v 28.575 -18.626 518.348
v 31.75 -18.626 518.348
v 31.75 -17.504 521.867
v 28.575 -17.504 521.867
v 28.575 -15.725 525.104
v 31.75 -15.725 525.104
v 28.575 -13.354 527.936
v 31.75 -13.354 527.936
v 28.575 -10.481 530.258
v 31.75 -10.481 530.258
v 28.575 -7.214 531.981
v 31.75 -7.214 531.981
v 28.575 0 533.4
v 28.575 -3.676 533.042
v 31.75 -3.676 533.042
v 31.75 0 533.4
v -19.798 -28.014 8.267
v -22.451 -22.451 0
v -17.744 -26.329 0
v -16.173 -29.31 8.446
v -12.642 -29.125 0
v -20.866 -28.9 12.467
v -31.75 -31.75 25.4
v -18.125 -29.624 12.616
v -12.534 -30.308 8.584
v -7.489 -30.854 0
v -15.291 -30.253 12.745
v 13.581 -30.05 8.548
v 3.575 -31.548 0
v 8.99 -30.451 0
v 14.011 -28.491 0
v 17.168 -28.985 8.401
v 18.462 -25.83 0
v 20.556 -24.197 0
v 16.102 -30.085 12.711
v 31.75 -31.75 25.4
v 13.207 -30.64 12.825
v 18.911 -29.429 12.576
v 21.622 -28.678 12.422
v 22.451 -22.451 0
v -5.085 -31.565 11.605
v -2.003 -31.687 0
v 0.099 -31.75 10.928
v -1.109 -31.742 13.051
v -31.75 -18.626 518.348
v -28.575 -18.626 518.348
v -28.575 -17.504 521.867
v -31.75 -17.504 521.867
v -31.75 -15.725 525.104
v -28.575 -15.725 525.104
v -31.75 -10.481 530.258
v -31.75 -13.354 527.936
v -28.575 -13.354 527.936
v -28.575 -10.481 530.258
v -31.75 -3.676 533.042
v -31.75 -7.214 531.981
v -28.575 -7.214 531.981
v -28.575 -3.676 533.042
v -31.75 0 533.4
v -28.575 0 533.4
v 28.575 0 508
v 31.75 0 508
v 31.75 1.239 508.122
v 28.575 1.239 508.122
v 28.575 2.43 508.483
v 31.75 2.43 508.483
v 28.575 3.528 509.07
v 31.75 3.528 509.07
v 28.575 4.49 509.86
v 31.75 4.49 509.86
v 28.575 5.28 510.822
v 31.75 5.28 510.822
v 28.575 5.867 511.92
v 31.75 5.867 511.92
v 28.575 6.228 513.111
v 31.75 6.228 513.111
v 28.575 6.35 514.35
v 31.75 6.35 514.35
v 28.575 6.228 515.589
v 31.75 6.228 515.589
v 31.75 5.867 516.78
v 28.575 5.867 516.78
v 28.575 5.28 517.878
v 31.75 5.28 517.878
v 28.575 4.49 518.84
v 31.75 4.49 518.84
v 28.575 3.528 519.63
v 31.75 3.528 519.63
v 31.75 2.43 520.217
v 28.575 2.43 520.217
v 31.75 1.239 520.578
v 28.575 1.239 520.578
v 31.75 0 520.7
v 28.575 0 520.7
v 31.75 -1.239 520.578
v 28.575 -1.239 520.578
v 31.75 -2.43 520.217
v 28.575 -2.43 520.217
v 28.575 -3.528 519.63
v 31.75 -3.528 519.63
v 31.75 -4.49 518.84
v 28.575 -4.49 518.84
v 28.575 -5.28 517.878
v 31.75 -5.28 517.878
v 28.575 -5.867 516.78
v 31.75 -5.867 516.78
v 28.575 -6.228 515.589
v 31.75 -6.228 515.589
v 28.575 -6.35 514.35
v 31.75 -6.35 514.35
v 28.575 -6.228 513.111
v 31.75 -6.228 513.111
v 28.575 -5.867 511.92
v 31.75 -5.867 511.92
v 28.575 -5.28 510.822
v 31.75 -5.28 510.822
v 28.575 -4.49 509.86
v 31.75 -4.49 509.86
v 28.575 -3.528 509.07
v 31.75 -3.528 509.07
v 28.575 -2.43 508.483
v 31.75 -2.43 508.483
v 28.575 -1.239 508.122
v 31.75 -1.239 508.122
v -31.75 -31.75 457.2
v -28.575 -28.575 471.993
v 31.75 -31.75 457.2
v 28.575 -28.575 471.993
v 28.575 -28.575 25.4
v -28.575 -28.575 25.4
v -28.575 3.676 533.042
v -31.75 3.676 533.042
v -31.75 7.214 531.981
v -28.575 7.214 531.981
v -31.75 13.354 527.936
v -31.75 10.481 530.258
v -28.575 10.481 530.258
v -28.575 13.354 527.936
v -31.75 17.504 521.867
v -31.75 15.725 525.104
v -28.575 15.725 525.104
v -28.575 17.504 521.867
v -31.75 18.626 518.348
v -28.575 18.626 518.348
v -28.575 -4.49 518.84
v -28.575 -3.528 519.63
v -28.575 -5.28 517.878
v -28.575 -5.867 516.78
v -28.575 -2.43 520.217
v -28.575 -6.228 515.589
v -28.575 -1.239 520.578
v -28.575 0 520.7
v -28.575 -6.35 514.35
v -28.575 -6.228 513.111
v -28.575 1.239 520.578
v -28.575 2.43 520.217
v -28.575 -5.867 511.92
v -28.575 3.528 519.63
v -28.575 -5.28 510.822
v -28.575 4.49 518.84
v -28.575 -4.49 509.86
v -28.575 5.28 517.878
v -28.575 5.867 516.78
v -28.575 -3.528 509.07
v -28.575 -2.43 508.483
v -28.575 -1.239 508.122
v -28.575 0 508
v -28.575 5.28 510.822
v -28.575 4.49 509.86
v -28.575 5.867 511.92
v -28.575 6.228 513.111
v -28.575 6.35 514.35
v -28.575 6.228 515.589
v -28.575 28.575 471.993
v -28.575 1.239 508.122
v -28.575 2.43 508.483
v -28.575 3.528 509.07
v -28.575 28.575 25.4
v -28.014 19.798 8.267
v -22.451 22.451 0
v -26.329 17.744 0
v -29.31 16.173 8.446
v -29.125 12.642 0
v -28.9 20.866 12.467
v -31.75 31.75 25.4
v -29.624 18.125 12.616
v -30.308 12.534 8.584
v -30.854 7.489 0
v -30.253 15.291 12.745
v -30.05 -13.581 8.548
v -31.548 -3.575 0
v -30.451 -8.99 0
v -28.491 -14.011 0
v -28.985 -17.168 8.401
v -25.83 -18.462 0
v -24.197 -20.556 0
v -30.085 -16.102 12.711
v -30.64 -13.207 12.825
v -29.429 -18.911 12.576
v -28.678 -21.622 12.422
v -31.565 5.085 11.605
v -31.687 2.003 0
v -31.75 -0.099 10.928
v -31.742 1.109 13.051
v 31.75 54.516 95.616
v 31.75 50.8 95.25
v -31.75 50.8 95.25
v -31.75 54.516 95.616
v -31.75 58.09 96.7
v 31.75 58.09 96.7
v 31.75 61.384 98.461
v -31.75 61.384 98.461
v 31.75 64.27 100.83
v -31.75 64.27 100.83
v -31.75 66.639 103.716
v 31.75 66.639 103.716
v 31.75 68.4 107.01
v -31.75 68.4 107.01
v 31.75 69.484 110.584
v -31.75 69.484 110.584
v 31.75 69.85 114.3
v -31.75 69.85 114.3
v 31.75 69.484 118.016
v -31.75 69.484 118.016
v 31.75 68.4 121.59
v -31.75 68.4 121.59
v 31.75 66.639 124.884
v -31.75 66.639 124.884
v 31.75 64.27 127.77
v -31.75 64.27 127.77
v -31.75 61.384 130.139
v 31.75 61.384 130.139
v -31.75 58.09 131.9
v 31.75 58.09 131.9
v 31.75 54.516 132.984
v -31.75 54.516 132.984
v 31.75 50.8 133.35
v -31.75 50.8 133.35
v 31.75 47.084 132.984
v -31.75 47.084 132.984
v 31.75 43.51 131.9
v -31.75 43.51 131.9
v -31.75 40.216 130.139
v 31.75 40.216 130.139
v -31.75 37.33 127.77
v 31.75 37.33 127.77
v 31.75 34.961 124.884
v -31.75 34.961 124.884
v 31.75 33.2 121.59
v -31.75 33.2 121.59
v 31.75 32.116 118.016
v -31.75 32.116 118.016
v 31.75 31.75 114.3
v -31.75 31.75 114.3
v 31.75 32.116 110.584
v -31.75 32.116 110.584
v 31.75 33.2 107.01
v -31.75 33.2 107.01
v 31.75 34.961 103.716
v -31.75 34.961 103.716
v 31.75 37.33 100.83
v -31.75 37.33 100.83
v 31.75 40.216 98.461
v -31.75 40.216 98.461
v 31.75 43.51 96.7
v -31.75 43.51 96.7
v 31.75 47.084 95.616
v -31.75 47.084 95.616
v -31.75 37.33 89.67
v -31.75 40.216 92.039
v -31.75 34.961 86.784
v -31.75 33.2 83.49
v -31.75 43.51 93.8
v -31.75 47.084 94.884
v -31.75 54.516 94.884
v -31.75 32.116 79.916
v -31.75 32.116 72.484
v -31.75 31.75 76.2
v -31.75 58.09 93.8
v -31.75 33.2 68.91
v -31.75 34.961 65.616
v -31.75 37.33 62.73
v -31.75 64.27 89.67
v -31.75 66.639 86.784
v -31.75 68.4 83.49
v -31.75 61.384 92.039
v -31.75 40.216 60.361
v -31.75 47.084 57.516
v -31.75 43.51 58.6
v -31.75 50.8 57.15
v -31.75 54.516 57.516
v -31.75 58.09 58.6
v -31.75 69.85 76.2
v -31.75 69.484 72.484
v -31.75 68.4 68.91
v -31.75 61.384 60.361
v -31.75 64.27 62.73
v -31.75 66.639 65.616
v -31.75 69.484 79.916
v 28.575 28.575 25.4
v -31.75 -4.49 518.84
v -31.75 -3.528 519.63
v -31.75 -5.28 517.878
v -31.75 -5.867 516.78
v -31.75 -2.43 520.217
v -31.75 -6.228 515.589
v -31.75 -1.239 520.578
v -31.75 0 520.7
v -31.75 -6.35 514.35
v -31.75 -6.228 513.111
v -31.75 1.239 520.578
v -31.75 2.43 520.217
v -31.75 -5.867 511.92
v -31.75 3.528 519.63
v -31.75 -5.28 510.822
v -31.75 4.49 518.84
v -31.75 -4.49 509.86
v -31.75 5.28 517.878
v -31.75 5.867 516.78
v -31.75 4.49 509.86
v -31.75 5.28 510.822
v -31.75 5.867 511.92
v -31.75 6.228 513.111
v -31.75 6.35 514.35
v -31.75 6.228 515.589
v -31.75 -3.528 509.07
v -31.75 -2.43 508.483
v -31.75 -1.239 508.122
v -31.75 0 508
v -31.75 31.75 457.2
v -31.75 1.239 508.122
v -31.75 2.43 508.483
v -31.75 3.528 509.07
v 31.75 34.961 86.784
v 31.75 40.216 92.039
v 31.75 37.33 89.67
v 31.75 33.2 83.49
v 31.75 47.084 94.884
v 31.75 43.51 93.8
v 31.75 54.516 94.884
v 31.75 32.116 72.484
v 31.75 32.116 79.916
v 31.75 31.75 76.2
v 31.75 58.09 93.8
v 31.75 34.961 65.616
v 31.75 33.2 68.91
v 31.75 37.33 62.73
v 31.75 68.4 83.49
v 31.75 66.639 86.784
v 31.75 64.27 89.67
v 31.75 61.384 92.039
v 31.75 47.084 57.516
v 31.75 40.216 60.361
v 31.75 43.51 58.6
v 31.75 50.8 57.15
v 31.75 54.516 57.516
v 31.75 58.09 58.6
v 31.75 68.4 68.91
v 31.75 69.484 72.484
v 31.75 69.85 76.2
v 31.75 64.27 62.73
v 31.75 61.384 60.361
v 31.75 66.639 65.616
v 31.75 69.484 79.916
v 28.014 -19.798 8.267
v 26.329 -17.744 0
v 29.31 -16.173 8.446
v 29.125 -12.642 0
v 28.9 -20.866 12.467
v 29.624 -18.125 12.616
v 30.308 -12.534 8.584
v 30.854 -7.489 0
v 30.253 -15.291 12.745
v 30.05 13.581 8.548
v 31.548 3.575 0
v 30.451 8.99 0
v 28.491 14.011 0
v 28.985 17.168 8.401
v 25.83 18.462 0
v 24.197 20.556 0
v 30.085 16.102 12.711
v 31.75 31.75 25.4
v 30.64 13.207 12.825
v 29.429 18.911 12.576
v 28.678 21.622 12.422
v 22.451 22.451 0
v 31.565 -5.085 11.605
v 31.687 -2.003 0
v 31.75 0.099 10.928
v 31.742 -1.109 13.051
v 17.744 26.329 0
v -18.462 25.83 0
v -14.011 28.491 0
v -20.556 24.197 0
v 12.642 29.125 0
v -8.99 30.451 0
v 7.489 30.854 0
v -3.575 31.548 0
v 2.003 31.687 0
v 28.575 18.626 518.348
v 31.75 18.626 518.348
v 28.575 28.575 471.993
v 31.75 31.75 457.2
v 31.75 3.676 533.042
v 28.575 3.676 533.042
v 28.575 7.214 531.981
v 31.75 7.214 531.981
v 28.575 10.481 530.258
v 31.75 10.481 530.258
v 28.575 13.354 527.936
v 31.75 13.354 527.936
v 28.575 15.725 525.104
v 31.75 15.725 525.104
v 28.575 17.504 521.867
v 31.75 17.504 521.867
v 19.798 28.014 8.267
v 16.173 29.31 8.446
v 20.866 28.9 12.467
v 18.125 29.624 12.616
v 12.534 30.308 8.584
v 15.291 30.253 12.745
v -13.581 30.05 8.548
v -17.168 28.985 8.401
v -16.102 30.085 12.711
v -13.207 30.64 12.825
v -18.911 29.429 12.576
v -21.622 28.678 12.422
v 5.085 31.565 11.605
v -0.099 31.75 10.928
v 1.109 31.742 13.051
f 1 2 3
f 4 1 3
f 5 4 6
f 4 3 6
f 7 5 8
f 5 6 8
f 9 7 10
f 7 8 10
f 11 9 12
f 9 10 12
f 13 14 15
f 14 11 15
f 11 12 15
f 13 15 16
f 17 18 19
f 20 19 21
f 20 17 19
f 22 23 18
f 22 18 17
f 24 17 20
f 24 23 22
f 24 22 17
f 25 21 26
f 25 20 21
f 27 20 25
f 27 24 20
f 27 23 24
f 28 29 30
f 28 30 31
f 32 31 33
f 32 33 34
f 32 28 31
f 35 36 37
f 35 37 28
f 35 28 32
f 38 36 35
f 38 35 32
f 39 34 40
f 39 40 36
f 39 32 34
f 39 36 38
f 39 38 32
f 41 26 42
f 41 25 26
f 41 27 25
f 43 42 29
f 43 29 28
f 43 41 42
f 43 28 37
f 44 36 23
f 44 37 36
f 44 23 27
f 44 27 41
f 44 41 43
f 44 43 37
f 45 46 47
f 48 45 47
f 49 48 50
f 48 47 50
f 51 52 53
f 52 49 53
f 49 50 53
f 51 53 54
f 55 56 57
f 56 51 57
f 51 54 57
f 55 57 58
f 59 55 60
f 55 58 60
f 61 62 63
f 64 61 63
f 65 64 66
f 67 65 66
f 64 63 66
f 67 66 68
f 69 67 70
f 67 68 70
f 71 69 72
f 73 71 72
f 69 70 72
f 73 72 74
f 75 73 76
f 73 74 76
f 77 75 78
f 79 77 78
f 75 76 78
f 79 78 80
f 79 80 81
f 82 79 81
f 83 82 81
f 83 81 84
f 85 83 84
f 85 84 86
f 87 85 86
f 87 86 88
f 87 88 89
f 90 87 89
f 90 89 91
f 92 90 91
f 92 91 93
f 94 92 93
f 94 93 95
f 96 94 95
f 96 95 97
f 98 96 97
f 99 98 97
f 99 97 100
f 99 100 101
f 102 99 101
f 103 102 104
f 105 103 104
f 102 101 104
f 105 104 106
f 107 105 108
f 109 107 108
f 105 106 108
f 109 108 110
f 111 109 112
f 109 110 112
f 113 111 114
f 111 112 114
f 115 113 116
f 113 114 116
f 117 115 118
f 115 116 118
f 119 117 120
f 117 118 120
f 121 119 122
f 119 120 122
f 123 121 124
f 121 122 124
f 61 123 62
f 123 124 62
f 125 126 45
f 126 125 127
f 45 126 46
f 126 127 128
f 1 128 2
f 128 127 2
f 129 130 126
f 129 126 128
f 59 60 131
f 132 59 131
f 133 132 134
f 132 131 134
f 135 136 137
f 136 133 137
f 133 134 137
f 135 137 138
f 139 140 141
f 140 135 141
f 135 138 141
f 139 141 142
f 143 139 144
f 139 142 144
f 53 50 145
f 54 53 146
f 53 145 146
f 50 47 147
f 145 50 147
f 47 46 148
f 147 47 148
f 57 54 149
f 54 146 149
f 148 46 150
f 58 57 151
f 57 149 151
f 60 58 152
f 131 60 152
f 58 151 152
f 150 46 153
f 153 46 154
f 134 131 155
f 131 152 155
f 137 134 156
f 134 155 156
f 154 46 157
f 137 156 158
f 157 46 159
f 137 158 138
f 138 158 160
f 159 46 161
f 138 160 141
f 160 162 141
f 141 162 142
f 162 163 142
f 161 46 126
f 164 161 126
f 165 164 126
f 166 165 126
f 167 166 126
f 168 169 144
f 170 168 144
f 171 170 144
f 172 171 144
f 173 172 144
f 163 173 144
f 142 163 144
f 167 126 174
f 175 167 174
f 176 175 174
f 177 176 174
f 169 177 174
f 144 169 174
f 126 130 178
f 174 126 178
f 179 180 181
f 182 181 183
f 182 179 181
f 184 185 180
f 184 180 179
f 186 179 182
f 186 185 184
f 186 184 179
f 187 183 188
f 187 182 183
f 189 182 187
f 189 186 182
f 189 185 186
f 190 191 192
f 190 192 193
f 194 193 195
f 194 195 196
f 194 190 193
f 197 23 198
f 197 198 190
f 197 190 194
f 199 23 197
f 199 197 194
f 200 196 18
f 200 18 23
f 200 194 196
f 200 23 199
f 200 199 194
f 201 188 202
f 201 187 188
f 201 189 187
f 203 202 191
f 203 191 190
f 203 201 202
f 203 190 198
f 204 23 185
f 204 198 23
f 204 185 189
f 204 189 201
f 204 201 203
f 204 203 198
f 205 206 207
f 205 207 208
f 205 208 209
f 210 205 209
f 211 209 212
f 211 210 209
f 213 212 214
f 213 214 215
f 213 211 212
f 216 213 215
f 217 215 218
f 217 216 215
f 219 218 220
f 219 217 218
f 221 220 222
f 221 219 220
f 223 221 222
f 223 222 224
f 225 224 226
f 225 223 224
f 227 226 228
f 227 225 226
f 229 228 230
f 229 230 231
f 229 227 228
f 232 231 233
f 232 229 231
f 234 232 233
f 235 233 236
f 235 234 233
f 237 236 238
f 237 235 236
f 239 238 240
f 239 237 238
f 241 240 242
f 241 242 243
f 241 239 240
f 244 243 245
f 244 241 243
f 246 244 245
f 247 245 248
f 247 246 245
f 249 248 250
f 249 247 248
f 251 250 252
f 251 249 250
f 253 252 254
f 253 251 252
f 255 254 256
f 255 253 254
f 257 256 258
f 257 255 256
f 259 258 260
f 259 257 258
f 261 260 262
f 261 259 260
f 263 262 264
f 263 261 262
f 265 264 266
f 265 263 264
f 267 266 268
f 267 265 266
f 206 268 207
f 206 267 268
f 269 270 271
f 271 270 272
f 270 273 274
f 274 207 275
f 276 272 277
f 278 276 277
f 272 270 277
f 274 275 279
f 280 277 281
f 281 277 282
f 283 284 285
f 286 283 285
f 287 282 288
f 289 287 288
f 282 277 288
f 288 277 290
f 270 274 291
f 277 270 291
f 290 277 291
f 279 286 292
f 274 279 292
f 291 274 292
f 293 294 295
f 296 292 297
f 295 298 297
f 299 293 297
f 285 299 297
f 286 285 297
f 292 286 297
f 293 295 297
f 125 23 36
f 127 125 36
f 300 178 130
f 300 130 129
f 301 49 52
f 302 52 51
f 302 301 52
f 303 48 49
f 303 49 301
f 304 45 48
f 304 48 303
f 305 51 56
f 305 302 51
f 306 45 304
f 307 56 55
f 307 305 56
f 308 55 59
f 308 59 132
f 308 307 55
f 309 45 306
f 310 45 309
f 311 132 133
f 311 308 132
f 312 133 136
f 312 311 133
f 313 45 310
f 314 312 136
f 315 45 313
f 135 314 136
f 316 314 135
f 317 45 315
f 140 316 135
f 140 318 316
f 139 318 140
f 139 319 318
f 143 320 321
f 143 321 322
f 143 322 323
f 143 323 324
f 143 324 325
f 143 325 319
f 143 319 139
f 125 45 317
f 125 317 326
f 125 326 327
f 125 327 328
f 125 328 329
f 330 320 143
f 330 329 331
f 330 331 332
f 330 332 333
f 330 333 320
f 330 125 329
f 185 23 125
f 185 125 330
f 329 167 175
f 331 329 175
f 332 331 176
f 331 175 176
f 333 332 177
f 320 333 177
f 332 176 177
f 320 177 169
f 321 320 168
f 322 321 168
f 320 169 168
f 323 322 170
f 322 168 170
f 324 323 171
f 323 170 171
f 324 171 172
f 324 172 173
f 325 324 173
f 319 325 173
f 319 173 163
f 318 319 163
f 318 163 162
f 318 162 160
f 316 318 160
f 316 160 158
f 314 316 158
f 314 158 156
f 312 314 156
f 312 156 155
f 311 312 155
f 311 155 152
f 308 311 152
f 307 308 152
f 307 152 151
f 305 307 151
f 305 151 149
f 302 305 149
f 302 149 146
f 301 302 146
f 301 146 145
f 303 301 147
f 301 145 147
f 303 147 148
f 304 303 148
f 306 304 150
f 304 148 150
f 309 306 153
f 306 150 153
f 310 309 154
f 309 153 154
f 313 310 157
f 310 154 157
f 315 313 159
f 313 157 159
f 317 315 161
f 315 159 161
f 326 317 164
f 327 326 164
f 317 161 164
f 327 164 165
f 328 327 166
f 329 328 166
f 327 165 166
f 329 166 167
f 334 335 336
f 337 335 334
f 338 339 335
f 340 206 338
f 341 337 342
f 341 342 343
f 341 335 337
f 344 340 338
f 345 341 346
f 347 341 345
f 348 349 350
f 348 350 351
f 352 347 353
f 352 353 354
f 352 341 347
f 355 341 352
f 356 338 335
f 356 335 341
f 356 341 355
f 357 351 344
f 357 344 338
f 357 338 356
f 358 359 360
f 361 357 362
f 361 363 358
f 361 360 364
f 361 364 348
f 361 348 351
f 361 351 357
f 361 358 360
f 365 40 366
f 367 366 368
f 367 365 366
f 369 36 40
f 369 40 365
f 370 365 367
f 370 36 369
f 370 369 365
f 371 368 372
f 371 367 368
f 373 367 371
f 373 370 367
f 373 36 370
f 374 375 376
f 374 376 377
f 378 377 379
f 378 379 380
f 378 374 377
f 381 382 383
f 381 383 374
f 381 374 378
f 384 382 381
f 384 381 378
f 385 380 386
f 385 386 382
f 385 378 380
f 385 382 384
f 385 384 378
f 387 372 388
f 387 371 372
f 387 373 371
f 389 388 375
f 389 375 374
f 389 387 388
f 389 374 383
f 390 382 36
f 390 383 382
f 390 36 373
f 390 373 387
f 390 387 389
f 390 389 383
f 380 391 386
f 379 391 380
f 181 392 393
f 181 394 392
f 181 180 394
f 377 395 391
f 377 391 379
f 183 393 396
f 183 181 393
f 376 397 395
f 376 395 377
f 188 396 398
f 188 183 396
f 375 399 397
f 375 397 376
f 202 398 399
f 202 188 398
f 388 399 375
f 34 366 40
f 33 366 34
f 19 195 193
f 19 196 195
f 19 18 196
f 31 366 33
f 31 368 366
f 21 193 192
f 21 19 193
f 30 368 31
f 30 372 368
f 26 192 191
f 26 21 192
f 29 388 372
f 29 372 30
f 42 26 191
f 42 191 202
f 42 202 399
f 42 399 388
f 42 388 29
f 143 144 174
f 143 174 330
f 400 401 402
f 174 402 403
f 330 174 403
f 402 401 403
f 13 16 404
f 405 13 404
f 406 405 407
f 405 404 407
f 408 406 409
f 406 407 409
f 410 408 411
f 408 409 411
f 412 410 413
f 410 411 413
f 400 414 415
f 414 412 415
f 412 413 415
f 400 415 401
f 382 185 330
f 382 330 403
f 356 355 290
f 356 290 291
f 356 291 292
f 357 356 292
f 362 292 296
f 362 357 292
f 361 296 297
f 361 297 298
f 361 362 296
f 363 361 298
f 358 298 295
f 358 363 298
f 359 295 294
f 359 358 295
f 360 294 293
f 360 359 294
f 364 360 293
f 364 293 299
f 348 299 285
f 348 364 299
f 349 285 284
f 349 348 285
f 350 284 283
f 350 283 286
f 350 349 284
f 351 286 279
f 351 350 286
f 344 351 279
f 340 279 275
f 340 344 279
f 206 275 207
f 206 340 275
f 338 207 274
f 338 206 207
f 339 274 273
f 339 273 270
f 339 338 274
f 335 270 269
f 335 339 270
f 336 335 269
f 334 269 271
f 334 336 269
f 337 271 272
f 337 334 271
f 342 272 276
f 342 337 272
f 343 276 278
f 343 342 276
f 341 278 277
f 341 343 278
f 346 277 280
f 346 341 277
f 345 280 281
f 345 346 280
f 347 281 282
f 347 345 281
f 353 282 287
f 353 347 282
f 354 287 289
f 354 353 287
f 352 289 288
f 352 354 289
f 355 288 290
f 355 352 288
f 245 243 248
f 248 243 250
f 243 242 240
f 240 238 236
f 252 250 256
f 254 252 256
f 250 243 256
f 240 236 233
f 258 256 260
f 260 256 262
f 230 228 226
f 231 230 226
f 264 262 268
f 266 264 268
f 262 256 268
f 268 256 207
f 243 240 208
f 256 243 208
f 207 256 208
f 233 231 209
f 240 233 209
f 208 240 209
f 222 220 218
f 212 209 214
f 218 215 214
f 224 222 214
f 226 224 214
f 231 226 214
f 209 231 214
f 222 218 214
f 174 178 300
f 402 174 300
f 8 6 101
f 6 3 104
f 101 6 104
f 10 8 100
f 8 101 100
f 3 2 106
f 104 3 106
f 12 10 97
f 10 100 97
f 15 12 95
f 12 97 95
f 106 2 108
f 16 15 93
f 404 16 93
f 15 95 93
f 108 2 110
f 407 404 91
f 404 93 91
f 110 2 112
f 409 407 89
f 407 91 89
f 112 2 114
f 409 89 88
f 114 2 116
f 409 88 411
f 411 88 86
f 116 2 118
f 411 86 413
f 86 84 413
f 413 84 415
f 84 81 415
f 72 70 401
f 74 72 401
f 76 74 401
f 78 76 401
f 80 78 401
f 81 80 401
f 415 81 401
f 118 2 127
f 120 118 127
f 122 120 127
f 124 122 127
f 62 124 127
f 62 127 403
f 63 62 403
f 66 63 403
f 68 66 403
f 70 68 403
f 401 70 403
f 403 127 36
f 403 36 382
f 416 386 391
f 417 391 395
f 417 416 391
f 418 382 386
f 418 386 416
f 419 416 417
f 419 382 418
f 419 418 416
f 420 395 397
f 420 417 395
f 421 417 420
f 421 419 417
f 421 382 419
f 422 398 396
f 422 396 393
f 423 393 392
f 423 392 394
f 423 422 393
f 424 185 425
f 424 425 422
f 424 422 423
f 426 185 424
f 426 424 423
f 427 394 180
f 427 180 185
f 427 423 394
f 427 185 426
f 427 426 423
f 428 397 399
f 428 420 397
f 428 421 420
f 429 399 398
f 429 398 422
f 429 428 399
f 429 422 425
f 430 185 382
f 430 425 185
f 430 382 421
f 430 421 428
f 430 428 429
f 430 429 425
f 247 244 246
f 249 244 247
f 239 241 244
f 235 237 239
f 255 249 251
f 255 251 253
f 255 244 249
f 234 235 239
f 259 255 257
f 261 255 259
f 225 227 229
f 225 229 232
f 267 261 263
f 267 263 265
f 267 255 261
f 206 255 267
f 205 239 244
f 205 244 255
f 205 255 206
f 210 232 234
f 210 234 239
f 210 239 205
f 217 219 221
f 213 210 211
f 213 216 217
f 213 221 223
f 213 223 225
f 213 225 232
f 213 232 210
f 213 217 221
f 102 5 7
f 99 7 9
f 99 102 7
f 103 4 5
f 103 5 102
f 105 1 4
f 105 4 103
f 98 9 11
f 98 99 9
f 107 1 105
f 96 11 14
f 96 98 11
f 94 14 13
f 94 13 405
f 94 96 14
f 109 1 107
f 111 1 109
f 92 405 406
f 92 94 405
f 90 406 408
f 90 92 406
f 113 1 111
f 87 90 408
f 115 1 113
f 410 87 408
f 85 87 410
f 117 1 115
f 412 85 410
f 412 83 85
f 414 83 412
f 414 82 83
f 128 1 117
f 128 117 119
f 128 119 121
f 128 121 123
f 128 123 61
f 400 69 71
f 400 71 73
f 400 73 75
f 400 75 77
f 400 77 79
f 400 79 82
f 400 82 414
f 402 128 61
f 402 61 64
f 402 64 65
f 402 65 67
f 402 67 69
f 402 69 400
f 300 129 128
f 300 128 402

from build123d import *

# Parameters (mm, degrees)
BOSS_EXTRUDE1_START   = 25.4
SKETCH1_W             = 63.5
SKETCH1_H             = 63.5
SKETCH1_W_2           = 57.15
SKETCH1_H_2           = 57.15
BOSS_EXTRUDE1_DEPTH   = 508
SKETCH3_W             = 63.5
SKETCH3_H             = 63.5
SKETCH4_R             = 6.35
CUT_EXTRUDE1_DEPTH    = 539.103960698
SKETCH5_R             = 19.05
BOSS_EXTRUDE2_DEPTH   = 63.5
BOSS_EXTRUDE2_2_DEPTH = 63.5


with BuildPart() as part:
    # Sketch1 → Boss-Extrude1 (new body)
    with BuildSketch(Plane.XY.offset(BOSS_EXTRUDE1_START)):
        Rectangle(SKETCH1_W, SKETCH1_H)
        Rectangle(SKETCH1_W_2, SKETCH1_H_2, mode=Mode.SUBTRACT)
    extrude(amount=BOSS_EXTRUDE1_DEPTH)

    # Sketch2 for Loft1 → Loft1 section 0
    with BuildSketch(Plane.XY):
        with BuildLine():
            # circular arc as an exact rational Bezier (weights 1, cos(half-angle), 1)
            Bezier((-22.450640303, 22.450640303), (-44.901280604, 0), (-22.450640303, -22.450640303), weights=[1, 0.707106781, 1])
            Bezier((-22.450640303, -22.450640303), (0, -44.901280604), (22.450640303, -22.450640303), weights=[1, 0.707106781, 1])
            Bezier((22.450640303, -22.450640303), (44.901280604, 0), (22.450640303, 22.450640303), weights=[1, 0.707106781, 1])
            Bezier((22.450640303, 22.450640303), (0, 44.901280604), (-22.450640303, 22.450640303), weights=[1, 0.707106781, 1])
        make_face()
    # Sketch3 → Loft1 section 1
    with BuildSketch(Plane(origin=(0, 0, 25.4), x_dir=(-1, 0, 0), z_dir=(0, 0, -1))):
        Rectangle(SKETCH3_W, SKETCH3_H)
    loft()

    # Sketch4 → Cut-Extrude1 (cut, through all)
    with BuildSketch(Plane(origin=(31.75, 0, 0), x_dir=(0, 0, -1), z_dir=(1, 0, 0))):
        with BuildLine():
            ThreePointArc((-518.347676468, -18.625817643), (-529.166515054, -11.973862436), (-533.4, 0))
            Line((-533.4, 0), (-533.4, -31.75))
            Line((-533.4, -31.75), (-457.2, -31.75))
            Line((-457.2, -31.75), (-518.347676468, -18.625817643))
        make_face()
        with BuildLine():
            ThreePointArc((-533.4, 0), (-529.166515054, 11.973862436), (-518.347676468, 18.625817643))
            Line((-518.347676468, 18.625817643), (-457.2, 31.75))
            Line((-457.2, 31.75), (-533.4, 31.75))
            Line((-533.4, 31.75), (-533.4, 0))
        make_face()
        with Locations((-514.35, 0)):
            Circle(SKETCH4_R)
    extrude(amount=-CUT_EXTRUDE1_DEPTH, mode=Mode.SUBTRACT)


with BuildPart() as body_2:
    # Sketch5 → Boss-Extrude2 (new body)
    with BuildSketch(Plane(origin=(31.75, 0, 0), x_dir=(0, 0, -1), z_dir=(1, 0, 0))):
        with Locations((-76.2, 50.8)):
            Circle(SKETCH5_R)
    extrude(amount=-BOSS_EXTRUDE2_DEPTH)


with BuildPart() as body_3:
    # Sketch5 → Boss-Extrude2 2 (new body)
    with BuildSketch(Plane(origin=(31.75, 0, 0), x_dir=(0, 0, -1), z_dir=(1, 0, 0))):
        with Locations((-114.3, 50.8)):
            Circle(SKETCH5_R)
    extrude(amount=-BOSS_EXTRUDE2_2_DEPTH)


solid = Compound([part.part, body_2.part, body_3.part])
